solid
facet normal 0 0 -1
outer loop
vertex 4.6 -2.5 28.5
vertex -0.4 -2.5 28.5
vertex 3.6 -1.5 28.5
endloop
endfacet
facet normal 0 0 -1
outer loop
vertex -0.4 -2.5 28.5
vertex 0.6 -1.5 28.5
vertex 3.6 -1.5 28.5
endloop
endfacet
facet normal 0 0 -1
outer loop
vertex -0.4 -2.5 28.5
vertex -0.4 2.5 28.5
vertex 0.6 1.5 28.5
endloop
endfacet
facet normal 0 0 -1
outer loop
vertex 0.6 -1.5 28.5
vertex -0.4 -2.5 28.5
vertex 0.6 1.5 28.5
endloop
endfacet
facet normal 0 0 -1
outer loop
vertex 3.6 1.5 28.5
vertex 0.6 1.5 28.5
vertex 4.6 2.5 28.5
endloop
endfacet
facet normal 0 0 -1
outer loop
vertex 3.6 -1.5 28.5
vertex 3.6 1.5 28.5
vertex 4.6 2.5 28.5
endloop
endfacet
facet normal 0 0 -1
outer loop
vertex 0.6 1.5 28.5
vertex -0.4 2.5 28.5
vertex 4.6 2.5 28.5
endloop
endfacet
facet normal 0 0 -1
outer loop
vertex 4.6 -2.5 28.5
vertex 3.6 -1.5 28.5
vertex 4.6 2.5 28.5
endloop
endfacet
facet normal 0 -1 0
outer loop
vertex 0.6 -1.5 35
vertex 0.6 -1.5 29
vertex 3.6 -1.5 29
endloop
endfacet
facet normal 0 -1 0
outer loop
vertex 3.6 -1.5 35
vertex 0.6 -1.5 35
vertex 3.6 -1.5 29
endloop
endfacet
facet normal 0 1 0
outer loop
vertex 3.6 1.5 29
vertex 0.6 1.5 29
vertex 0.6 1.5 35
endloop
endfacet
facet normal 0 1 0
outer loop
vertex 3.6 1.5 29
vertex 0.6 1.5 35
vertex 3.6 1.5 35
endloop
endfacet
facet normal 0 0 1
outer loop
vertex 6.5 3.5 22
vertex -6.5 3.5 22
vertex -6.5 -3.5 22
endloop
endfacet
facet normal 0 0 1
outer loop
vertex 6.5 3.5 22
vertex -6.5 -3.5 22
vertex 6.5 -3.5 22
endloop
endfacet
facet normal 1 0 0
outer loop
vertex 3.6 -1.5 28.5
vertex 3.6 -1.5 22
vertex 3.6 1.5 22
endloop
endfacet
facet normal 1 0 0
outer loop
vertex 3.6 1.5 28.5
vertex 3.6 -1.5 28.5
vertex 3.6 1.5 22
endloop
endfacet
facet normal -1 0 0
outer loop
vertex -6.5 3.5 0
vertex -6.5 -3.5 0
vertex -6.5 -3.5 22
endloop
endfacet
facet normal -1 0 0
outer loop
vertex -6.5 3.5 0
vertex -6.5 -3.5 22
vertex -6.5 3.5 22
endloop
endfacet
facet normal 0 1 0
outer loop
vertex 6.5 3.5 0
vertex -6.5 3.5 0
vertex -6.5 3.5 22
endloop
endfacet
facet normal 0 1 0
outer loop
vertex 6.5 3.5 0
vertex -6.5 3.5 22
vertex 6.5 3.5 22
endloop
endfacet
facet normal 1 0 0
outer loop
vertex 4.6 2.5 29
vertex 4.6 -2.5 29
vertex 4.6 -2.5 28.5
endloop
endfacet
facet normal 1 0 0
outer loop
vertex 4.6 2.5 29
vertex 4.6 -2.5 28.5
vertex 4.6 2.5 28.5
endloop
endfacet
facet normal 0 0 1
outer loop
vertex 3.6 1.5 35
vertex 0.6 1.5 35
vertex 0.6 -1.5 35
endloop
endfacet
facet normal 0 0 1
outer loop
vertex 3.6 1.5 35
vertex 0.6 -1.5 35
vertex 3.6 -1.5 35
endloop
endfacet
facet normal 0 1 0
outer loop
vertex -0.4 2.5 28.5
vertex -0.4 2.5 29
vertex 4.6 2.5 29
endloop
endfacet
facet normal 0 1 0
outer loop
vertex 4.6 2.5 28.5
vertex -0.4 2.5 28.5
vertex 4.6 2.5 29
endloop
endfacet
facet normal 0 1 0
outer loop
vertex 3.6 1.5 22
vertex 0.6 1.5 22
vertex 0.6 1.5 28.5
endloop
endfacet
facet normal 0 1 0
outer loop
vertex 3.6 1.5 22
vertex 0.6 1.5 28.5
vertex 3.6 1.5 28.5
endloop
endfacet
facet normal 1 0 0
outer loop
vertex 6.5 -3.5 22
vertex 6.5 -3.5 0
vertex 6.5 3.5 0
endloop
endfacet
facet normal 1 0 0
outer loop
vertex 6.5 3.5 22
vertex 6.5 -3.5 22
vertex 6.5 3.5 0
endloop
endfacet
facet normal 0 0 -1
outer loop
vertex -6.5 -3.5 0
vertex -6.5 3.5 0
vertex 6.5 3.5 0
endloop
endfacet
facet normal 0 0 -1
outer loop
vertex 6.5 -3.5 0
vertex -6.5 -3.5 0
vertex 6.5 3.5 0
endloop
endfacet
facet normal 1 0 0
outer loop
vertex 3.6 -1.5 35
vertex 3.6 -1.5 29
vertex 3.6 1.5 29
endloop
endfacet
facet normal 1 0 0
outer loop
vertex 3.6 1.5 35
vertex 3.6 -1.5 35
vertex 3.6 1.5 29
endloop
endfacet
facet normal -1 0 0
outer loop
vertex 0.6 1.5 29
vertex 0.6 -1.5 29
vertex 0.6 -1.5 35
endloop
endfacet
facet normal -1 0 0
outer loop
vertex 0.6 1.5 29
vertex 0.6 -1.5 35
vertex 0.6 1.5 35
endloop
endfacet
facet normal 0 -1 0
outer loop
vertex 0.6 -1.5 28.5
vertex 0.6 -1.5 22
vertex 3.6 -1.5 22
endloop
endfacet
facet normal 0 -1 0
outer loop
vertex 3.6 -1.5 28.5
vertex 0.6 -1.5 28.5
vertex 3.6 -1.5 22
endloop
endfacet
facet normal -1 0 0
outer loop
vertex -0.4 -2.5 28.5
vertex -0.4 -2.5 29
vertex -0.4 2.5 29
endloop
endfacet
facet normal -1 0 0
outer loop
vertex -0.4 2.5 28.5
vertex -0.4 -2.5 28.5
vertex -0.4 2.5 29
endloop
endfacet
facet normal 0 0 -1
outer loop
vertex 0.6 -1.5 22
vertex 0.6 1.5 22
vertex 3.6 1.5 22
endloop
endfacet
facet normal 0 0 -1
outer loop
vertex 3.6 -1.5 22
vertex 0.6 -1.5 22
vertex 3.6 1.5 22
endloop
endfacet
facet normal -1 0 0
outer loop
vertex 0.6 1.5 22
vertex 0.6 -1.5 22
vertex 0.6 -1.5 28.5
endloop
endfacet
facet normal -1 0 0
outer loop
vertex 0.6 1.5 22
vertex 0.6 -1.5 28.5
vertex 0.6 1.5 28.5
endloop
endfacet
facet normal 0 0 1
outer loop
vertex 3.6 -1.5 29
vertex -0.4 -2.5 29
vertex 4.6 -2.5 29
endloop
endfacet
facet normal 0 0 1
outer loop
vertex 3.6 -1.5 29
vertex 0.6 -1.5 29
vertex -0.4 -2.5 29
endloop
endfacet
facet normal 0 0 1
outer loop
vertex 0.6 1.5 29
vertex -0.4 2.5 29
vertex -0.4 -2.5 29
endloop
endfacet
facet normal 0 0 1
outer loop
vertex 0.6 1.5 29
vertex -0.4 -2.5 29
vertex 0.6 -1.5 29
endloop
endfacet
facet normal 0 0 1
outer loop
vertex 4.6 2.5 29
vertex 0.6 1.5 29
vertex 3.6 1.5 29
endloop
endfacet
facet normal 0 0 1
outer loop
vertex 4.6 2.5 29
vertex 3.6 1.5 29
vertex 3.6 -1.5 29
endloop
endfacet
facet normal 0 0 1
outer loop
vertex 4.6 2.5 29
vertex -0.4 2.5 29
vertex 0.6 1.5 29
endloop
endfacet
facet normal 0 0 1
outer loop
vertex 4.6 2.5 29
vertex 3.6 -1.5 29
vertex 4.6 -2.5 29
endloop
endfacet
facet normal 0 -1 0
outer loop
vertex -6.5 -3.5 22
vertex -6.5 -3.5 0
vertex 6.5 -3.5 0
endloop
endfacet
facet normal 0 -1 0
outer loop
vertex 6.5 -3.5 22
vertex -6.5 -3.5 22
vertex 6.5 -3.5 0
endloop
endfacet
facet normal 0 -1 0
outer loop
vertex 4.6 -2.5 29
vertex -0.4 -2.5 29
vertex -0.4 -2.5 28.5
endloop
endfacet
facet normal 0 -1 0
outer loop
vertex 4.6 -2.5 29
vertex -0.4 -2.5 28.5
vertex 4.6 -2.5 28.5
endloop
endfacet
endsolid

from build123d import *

# Parameters (mm, degrees)
F0_W     = 13
F0_H     = 7
F1_DEPTH = 22
F2_W     = 3
F2_H     = 3
F3_DEPTH = 13
F5_W     = 5
F5_H     = 5
F6_DEPTH = 0.5


with BuildPart() as f1:
    # F0 (on Top) → F1 (new body)
    with BuildSketch(Plane.XY):
        Rectangle(F0_W, F0_H)
    extrude(amount=F1_DEPTH)


with BuildPart() as f3:
    # F2 (on face) → F3 (new body)
    with BuildSketch(Plane.XY.offset(22)):
        with Locations((2.1, 0)):
            Rectangle(F2_W, F2_H)
    extrude(amount=F3_DEPTH)

    # F5 (on offset) → F6 (join)
    with BuildSketch(Plane.XY.offset(29)):
        with Locations((2.1, 0)):
            Rectangle(F5_W, F5_H)
    extrude(amount=-F6_DEPTH)


solid = Compound([f1.part, f3.part])
